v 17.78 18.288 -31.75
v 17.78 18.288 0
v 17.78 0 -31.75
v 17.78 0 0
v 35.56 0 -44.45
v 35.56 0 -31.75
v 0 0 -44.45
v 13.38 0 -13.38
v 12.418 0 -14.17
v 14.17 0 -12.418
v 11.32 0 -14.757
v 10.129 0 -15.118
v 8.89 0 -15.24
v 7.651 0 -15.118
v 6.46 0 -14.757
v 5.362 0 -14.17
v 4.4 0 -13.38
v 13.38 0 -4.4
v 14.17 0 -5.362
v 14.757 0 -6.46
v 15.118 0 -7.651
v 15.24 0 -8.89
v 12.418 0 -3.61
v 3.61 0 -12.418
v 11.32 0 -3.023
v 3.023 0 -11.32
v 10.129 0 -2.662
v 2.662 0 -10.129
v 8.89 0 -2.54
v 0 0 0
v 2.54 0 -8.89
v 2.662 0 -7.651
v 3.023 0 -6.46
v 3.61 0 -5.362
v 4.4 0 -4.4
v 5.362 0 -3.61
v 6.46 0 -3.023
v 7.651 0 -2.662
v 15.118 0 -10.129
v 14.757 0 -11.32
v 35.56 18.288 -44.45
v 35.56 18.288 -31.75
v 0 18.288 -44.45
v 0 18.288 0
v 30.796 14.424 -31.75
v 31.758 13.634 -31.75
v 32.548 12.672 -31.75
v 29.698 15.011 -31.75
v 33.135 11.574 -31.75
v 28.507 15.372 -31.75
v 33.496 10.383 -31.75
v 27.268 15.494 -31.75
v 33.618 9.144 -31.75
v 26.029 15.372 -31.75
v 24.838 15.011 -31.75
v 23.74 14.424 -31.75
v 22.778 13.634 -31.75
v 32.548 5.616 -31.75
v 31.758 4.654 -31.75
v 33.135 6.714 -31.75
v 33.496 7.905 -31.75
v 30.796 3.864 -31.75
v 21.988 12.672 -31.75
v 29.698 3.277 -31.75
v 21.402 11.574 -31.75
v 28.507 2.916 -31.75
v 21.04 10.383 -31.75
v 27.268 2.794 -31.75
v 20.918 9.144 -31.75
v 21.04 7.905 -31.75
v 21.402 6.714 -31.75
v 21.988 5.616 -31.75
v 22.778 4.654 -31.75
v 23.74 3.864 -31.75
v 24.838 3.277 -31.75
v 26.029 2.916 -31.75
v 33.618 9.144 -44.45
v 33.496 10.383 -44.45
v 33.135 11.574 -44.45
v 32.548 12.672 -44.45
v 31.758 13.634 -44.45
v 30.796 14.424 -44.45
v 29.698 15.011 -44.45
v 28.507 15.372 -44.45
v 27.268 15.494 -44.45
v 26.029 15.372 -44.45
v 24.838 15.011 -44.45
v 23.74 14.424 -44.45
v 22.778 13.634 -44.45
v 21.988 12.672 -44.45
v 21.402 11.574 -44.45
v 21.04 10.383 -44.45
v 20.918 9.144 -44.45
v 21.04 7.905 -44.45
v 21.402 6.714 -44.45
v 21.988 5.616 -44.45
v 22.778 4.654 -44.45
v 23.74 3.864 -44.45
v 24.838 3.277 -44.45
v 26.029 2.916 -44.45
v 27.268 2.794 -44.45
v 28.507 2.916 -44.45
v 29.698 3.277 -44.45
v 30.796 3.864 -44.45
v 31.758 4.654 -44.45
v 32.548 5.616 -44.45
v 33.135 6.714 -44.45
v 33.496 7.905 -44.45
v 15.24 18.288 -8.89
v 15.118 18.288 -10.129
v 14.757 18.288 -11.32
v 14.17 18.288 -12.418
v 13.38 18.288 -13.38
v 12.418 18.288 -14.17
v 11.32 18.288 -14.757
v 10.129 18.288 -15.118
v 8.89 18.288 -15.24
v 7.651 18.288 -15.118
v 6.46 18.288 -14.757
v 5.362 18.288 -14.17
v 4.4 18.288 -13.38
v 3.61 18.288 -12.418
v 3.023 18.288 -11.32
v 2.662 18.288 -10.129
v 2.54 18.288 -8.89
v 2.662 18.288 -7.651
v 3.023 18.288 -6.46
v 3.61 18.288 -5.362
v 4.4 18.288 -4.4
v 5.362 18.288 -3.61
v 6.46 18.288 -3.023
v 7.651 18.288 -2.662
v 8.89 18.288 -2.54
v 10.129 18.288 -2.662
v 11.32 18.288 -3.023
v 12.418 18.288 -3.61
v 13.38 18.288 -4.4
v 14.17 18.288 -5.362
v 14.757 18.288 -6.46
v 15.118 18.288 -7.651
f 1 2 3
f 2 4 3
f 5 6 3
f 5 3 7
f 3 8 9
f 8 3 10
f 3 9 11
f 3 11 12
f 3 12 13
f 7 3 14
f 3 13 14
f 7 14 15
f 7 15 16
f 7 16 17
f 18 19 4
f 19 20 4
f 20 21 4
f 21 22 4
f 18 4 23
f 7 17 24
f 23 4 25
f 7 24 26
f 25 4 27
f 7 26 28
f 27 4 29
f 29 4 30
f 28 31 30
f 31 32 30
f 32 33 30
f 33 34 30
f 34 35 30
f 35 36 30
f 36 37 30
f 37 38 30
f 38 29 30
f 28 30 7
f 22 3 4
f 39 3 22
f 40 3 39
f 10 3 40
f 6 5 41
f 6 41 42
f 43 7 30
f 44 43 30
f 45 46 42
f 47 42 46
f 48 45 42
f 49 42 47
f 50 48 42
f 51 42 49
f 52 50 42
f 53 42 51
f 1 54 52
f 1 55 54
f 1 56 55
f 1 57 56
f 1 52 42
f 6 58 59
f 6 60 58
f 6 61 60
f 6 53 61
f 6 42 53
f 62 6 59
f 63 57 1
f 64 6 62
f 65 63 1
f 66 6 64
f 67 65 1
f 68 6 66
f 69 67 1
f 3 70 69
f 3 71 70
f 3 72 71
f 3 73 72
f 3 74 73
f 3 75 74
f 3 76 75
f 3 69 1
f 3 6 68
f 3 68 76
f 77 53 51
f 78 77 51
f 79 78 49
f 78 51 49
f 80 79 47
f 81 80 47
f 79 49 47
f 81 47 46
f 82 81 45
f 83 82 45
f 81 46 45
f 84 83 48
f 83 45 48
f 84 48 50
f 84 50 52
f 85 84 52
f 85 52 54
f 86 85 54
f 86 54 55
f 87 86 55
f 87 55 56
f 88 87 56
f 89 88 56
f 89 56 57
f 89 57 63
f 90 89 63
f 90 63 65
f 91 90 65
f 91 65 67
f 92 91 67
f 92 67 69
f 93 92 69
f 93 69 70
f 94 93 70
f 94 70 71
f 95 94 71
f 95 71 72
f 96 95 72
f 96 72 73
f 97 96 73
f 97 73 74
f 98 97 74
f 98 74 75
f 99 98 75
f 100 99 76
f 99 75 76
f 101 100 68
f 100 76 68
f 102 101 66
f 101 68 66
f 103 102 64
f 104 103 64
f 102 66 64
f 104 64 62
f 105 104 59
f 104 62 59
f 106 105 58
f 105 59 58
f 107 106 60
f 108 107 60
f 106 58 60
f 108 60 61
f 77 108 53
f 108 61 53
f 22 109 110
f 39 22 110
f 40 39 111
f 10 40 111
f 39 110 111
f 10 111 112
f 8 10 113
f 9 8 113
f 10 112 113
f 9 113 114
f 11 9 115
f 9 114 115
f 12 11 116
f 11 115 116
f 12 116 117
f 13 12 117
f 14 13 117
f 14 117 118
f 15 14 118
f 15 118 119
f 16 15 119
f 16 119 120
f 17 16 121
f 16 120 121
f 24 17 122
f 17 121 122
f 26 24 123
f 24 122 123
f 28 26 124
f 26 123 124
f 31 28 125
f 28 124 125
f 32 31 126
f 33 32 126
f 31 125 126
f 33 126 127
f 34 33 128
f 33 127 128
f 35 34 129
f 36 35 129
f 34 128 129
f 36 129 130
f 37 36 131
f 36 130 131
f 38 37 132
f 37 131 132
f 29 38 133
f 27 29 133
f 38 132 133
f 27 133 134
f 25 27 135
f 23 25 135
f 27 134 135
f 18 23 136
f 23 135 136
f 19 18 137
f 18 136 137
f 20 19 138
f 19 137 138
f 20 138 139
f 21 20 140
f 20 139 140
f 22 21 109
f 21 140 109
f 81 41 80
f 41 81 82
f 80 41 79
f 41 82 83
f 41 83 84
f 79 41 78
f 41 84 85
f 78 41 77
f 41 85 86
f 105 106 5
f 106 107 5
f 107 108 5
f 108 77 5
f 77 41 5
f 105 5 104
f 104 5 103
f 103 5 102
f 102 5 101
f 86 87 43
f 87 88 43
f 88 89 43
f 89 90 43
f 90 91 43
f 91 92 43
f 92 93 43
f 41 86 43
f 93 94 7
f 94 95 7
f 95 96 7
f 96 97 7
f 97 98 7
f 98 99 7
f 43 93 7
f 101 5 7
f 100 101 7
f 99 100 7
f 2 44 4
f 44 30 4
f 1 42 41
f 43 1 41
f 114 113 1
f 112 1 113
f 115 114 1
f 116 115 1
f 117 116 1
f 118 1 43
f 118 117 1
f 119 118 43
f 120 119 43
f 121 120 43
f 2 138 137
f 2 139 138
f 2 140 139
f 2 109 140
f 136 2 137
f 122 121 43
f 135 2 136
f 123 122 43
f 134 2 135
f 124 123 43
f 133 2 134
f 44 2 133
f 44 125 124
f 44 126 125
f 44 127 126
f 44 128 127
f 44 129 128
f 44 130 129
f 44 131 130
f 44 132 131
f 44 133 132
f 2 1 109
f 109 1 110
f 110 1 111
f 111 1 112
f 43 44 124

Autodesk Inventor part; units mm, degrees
ref_plane "YZ Plane" through (0, 0, 0) normal (1, 0, 0) x (0, 1, 0)
ref_plane "XZ Plane" through (0, 0, 0) normal (0, 1, 0) x (-1, 0, 0)
ref_plane "XY Plane" through (0, 0, 0) normal (0, 0, 1) x (1, 0, 0)
sketch "Sketch1" plane through (0, 0, 0) normal (0, 1, 0) x (-1, 0, 0)
  line L0 (0, 0) -> (-17.78, 0)
  line L1 (-17.78, 0) -> (-17.78, -44.45)
  line L2 (-17.78, -44.45) -> (0, -44.45)
  line L3 (0, -44.45) -> (0, 0)
  line L4 (-17.78, -44.45) -> (-35.56, -44.45)
  line L5 (-35.56, -44.45) -> (-35.56, -31.75)
  line L6 (-35.56, -31.75) -> (-17.78, -31.75)
  line L7 (-17.78, -31.75) -> (-17.78, -44.45)
  dimension "d0" = 17.78
  dimension "d1" = 44.45
  dimension "d2" = 17.78
  dimension "d3" = 12.7
extrude "Extrusion1" add sketch "Sketch1" along normal blind 18.288
sketch "Sketch2" plane through (17.78, 0, -31.75) normal (0, 0, 1) x (1, 0, 0)
  circle A0 centre (9.4883, 9.144) radius 6.35
  point P0 (-17.78, 0)
  dimension "d6" = 12.7
extrude "Extrusion2" cut sketch "Sketch2" against normal blind 12.7
sketch "Sketch3" plane through (0, 18.288, 0) normal (0, 1, 0) x (1, 0, 0)
  circle A0 centre (8.89, 8.89) radius 6.35
  line L0 (0, 0) -> (17.78, 0) projected
  dimension "d9" = 12.7
  dimension "d10" = 8.89
extrude "Extrusion3" cut sketch "Sketch3" against normal blind 18.288
properties part number "Pivot Point 2"
